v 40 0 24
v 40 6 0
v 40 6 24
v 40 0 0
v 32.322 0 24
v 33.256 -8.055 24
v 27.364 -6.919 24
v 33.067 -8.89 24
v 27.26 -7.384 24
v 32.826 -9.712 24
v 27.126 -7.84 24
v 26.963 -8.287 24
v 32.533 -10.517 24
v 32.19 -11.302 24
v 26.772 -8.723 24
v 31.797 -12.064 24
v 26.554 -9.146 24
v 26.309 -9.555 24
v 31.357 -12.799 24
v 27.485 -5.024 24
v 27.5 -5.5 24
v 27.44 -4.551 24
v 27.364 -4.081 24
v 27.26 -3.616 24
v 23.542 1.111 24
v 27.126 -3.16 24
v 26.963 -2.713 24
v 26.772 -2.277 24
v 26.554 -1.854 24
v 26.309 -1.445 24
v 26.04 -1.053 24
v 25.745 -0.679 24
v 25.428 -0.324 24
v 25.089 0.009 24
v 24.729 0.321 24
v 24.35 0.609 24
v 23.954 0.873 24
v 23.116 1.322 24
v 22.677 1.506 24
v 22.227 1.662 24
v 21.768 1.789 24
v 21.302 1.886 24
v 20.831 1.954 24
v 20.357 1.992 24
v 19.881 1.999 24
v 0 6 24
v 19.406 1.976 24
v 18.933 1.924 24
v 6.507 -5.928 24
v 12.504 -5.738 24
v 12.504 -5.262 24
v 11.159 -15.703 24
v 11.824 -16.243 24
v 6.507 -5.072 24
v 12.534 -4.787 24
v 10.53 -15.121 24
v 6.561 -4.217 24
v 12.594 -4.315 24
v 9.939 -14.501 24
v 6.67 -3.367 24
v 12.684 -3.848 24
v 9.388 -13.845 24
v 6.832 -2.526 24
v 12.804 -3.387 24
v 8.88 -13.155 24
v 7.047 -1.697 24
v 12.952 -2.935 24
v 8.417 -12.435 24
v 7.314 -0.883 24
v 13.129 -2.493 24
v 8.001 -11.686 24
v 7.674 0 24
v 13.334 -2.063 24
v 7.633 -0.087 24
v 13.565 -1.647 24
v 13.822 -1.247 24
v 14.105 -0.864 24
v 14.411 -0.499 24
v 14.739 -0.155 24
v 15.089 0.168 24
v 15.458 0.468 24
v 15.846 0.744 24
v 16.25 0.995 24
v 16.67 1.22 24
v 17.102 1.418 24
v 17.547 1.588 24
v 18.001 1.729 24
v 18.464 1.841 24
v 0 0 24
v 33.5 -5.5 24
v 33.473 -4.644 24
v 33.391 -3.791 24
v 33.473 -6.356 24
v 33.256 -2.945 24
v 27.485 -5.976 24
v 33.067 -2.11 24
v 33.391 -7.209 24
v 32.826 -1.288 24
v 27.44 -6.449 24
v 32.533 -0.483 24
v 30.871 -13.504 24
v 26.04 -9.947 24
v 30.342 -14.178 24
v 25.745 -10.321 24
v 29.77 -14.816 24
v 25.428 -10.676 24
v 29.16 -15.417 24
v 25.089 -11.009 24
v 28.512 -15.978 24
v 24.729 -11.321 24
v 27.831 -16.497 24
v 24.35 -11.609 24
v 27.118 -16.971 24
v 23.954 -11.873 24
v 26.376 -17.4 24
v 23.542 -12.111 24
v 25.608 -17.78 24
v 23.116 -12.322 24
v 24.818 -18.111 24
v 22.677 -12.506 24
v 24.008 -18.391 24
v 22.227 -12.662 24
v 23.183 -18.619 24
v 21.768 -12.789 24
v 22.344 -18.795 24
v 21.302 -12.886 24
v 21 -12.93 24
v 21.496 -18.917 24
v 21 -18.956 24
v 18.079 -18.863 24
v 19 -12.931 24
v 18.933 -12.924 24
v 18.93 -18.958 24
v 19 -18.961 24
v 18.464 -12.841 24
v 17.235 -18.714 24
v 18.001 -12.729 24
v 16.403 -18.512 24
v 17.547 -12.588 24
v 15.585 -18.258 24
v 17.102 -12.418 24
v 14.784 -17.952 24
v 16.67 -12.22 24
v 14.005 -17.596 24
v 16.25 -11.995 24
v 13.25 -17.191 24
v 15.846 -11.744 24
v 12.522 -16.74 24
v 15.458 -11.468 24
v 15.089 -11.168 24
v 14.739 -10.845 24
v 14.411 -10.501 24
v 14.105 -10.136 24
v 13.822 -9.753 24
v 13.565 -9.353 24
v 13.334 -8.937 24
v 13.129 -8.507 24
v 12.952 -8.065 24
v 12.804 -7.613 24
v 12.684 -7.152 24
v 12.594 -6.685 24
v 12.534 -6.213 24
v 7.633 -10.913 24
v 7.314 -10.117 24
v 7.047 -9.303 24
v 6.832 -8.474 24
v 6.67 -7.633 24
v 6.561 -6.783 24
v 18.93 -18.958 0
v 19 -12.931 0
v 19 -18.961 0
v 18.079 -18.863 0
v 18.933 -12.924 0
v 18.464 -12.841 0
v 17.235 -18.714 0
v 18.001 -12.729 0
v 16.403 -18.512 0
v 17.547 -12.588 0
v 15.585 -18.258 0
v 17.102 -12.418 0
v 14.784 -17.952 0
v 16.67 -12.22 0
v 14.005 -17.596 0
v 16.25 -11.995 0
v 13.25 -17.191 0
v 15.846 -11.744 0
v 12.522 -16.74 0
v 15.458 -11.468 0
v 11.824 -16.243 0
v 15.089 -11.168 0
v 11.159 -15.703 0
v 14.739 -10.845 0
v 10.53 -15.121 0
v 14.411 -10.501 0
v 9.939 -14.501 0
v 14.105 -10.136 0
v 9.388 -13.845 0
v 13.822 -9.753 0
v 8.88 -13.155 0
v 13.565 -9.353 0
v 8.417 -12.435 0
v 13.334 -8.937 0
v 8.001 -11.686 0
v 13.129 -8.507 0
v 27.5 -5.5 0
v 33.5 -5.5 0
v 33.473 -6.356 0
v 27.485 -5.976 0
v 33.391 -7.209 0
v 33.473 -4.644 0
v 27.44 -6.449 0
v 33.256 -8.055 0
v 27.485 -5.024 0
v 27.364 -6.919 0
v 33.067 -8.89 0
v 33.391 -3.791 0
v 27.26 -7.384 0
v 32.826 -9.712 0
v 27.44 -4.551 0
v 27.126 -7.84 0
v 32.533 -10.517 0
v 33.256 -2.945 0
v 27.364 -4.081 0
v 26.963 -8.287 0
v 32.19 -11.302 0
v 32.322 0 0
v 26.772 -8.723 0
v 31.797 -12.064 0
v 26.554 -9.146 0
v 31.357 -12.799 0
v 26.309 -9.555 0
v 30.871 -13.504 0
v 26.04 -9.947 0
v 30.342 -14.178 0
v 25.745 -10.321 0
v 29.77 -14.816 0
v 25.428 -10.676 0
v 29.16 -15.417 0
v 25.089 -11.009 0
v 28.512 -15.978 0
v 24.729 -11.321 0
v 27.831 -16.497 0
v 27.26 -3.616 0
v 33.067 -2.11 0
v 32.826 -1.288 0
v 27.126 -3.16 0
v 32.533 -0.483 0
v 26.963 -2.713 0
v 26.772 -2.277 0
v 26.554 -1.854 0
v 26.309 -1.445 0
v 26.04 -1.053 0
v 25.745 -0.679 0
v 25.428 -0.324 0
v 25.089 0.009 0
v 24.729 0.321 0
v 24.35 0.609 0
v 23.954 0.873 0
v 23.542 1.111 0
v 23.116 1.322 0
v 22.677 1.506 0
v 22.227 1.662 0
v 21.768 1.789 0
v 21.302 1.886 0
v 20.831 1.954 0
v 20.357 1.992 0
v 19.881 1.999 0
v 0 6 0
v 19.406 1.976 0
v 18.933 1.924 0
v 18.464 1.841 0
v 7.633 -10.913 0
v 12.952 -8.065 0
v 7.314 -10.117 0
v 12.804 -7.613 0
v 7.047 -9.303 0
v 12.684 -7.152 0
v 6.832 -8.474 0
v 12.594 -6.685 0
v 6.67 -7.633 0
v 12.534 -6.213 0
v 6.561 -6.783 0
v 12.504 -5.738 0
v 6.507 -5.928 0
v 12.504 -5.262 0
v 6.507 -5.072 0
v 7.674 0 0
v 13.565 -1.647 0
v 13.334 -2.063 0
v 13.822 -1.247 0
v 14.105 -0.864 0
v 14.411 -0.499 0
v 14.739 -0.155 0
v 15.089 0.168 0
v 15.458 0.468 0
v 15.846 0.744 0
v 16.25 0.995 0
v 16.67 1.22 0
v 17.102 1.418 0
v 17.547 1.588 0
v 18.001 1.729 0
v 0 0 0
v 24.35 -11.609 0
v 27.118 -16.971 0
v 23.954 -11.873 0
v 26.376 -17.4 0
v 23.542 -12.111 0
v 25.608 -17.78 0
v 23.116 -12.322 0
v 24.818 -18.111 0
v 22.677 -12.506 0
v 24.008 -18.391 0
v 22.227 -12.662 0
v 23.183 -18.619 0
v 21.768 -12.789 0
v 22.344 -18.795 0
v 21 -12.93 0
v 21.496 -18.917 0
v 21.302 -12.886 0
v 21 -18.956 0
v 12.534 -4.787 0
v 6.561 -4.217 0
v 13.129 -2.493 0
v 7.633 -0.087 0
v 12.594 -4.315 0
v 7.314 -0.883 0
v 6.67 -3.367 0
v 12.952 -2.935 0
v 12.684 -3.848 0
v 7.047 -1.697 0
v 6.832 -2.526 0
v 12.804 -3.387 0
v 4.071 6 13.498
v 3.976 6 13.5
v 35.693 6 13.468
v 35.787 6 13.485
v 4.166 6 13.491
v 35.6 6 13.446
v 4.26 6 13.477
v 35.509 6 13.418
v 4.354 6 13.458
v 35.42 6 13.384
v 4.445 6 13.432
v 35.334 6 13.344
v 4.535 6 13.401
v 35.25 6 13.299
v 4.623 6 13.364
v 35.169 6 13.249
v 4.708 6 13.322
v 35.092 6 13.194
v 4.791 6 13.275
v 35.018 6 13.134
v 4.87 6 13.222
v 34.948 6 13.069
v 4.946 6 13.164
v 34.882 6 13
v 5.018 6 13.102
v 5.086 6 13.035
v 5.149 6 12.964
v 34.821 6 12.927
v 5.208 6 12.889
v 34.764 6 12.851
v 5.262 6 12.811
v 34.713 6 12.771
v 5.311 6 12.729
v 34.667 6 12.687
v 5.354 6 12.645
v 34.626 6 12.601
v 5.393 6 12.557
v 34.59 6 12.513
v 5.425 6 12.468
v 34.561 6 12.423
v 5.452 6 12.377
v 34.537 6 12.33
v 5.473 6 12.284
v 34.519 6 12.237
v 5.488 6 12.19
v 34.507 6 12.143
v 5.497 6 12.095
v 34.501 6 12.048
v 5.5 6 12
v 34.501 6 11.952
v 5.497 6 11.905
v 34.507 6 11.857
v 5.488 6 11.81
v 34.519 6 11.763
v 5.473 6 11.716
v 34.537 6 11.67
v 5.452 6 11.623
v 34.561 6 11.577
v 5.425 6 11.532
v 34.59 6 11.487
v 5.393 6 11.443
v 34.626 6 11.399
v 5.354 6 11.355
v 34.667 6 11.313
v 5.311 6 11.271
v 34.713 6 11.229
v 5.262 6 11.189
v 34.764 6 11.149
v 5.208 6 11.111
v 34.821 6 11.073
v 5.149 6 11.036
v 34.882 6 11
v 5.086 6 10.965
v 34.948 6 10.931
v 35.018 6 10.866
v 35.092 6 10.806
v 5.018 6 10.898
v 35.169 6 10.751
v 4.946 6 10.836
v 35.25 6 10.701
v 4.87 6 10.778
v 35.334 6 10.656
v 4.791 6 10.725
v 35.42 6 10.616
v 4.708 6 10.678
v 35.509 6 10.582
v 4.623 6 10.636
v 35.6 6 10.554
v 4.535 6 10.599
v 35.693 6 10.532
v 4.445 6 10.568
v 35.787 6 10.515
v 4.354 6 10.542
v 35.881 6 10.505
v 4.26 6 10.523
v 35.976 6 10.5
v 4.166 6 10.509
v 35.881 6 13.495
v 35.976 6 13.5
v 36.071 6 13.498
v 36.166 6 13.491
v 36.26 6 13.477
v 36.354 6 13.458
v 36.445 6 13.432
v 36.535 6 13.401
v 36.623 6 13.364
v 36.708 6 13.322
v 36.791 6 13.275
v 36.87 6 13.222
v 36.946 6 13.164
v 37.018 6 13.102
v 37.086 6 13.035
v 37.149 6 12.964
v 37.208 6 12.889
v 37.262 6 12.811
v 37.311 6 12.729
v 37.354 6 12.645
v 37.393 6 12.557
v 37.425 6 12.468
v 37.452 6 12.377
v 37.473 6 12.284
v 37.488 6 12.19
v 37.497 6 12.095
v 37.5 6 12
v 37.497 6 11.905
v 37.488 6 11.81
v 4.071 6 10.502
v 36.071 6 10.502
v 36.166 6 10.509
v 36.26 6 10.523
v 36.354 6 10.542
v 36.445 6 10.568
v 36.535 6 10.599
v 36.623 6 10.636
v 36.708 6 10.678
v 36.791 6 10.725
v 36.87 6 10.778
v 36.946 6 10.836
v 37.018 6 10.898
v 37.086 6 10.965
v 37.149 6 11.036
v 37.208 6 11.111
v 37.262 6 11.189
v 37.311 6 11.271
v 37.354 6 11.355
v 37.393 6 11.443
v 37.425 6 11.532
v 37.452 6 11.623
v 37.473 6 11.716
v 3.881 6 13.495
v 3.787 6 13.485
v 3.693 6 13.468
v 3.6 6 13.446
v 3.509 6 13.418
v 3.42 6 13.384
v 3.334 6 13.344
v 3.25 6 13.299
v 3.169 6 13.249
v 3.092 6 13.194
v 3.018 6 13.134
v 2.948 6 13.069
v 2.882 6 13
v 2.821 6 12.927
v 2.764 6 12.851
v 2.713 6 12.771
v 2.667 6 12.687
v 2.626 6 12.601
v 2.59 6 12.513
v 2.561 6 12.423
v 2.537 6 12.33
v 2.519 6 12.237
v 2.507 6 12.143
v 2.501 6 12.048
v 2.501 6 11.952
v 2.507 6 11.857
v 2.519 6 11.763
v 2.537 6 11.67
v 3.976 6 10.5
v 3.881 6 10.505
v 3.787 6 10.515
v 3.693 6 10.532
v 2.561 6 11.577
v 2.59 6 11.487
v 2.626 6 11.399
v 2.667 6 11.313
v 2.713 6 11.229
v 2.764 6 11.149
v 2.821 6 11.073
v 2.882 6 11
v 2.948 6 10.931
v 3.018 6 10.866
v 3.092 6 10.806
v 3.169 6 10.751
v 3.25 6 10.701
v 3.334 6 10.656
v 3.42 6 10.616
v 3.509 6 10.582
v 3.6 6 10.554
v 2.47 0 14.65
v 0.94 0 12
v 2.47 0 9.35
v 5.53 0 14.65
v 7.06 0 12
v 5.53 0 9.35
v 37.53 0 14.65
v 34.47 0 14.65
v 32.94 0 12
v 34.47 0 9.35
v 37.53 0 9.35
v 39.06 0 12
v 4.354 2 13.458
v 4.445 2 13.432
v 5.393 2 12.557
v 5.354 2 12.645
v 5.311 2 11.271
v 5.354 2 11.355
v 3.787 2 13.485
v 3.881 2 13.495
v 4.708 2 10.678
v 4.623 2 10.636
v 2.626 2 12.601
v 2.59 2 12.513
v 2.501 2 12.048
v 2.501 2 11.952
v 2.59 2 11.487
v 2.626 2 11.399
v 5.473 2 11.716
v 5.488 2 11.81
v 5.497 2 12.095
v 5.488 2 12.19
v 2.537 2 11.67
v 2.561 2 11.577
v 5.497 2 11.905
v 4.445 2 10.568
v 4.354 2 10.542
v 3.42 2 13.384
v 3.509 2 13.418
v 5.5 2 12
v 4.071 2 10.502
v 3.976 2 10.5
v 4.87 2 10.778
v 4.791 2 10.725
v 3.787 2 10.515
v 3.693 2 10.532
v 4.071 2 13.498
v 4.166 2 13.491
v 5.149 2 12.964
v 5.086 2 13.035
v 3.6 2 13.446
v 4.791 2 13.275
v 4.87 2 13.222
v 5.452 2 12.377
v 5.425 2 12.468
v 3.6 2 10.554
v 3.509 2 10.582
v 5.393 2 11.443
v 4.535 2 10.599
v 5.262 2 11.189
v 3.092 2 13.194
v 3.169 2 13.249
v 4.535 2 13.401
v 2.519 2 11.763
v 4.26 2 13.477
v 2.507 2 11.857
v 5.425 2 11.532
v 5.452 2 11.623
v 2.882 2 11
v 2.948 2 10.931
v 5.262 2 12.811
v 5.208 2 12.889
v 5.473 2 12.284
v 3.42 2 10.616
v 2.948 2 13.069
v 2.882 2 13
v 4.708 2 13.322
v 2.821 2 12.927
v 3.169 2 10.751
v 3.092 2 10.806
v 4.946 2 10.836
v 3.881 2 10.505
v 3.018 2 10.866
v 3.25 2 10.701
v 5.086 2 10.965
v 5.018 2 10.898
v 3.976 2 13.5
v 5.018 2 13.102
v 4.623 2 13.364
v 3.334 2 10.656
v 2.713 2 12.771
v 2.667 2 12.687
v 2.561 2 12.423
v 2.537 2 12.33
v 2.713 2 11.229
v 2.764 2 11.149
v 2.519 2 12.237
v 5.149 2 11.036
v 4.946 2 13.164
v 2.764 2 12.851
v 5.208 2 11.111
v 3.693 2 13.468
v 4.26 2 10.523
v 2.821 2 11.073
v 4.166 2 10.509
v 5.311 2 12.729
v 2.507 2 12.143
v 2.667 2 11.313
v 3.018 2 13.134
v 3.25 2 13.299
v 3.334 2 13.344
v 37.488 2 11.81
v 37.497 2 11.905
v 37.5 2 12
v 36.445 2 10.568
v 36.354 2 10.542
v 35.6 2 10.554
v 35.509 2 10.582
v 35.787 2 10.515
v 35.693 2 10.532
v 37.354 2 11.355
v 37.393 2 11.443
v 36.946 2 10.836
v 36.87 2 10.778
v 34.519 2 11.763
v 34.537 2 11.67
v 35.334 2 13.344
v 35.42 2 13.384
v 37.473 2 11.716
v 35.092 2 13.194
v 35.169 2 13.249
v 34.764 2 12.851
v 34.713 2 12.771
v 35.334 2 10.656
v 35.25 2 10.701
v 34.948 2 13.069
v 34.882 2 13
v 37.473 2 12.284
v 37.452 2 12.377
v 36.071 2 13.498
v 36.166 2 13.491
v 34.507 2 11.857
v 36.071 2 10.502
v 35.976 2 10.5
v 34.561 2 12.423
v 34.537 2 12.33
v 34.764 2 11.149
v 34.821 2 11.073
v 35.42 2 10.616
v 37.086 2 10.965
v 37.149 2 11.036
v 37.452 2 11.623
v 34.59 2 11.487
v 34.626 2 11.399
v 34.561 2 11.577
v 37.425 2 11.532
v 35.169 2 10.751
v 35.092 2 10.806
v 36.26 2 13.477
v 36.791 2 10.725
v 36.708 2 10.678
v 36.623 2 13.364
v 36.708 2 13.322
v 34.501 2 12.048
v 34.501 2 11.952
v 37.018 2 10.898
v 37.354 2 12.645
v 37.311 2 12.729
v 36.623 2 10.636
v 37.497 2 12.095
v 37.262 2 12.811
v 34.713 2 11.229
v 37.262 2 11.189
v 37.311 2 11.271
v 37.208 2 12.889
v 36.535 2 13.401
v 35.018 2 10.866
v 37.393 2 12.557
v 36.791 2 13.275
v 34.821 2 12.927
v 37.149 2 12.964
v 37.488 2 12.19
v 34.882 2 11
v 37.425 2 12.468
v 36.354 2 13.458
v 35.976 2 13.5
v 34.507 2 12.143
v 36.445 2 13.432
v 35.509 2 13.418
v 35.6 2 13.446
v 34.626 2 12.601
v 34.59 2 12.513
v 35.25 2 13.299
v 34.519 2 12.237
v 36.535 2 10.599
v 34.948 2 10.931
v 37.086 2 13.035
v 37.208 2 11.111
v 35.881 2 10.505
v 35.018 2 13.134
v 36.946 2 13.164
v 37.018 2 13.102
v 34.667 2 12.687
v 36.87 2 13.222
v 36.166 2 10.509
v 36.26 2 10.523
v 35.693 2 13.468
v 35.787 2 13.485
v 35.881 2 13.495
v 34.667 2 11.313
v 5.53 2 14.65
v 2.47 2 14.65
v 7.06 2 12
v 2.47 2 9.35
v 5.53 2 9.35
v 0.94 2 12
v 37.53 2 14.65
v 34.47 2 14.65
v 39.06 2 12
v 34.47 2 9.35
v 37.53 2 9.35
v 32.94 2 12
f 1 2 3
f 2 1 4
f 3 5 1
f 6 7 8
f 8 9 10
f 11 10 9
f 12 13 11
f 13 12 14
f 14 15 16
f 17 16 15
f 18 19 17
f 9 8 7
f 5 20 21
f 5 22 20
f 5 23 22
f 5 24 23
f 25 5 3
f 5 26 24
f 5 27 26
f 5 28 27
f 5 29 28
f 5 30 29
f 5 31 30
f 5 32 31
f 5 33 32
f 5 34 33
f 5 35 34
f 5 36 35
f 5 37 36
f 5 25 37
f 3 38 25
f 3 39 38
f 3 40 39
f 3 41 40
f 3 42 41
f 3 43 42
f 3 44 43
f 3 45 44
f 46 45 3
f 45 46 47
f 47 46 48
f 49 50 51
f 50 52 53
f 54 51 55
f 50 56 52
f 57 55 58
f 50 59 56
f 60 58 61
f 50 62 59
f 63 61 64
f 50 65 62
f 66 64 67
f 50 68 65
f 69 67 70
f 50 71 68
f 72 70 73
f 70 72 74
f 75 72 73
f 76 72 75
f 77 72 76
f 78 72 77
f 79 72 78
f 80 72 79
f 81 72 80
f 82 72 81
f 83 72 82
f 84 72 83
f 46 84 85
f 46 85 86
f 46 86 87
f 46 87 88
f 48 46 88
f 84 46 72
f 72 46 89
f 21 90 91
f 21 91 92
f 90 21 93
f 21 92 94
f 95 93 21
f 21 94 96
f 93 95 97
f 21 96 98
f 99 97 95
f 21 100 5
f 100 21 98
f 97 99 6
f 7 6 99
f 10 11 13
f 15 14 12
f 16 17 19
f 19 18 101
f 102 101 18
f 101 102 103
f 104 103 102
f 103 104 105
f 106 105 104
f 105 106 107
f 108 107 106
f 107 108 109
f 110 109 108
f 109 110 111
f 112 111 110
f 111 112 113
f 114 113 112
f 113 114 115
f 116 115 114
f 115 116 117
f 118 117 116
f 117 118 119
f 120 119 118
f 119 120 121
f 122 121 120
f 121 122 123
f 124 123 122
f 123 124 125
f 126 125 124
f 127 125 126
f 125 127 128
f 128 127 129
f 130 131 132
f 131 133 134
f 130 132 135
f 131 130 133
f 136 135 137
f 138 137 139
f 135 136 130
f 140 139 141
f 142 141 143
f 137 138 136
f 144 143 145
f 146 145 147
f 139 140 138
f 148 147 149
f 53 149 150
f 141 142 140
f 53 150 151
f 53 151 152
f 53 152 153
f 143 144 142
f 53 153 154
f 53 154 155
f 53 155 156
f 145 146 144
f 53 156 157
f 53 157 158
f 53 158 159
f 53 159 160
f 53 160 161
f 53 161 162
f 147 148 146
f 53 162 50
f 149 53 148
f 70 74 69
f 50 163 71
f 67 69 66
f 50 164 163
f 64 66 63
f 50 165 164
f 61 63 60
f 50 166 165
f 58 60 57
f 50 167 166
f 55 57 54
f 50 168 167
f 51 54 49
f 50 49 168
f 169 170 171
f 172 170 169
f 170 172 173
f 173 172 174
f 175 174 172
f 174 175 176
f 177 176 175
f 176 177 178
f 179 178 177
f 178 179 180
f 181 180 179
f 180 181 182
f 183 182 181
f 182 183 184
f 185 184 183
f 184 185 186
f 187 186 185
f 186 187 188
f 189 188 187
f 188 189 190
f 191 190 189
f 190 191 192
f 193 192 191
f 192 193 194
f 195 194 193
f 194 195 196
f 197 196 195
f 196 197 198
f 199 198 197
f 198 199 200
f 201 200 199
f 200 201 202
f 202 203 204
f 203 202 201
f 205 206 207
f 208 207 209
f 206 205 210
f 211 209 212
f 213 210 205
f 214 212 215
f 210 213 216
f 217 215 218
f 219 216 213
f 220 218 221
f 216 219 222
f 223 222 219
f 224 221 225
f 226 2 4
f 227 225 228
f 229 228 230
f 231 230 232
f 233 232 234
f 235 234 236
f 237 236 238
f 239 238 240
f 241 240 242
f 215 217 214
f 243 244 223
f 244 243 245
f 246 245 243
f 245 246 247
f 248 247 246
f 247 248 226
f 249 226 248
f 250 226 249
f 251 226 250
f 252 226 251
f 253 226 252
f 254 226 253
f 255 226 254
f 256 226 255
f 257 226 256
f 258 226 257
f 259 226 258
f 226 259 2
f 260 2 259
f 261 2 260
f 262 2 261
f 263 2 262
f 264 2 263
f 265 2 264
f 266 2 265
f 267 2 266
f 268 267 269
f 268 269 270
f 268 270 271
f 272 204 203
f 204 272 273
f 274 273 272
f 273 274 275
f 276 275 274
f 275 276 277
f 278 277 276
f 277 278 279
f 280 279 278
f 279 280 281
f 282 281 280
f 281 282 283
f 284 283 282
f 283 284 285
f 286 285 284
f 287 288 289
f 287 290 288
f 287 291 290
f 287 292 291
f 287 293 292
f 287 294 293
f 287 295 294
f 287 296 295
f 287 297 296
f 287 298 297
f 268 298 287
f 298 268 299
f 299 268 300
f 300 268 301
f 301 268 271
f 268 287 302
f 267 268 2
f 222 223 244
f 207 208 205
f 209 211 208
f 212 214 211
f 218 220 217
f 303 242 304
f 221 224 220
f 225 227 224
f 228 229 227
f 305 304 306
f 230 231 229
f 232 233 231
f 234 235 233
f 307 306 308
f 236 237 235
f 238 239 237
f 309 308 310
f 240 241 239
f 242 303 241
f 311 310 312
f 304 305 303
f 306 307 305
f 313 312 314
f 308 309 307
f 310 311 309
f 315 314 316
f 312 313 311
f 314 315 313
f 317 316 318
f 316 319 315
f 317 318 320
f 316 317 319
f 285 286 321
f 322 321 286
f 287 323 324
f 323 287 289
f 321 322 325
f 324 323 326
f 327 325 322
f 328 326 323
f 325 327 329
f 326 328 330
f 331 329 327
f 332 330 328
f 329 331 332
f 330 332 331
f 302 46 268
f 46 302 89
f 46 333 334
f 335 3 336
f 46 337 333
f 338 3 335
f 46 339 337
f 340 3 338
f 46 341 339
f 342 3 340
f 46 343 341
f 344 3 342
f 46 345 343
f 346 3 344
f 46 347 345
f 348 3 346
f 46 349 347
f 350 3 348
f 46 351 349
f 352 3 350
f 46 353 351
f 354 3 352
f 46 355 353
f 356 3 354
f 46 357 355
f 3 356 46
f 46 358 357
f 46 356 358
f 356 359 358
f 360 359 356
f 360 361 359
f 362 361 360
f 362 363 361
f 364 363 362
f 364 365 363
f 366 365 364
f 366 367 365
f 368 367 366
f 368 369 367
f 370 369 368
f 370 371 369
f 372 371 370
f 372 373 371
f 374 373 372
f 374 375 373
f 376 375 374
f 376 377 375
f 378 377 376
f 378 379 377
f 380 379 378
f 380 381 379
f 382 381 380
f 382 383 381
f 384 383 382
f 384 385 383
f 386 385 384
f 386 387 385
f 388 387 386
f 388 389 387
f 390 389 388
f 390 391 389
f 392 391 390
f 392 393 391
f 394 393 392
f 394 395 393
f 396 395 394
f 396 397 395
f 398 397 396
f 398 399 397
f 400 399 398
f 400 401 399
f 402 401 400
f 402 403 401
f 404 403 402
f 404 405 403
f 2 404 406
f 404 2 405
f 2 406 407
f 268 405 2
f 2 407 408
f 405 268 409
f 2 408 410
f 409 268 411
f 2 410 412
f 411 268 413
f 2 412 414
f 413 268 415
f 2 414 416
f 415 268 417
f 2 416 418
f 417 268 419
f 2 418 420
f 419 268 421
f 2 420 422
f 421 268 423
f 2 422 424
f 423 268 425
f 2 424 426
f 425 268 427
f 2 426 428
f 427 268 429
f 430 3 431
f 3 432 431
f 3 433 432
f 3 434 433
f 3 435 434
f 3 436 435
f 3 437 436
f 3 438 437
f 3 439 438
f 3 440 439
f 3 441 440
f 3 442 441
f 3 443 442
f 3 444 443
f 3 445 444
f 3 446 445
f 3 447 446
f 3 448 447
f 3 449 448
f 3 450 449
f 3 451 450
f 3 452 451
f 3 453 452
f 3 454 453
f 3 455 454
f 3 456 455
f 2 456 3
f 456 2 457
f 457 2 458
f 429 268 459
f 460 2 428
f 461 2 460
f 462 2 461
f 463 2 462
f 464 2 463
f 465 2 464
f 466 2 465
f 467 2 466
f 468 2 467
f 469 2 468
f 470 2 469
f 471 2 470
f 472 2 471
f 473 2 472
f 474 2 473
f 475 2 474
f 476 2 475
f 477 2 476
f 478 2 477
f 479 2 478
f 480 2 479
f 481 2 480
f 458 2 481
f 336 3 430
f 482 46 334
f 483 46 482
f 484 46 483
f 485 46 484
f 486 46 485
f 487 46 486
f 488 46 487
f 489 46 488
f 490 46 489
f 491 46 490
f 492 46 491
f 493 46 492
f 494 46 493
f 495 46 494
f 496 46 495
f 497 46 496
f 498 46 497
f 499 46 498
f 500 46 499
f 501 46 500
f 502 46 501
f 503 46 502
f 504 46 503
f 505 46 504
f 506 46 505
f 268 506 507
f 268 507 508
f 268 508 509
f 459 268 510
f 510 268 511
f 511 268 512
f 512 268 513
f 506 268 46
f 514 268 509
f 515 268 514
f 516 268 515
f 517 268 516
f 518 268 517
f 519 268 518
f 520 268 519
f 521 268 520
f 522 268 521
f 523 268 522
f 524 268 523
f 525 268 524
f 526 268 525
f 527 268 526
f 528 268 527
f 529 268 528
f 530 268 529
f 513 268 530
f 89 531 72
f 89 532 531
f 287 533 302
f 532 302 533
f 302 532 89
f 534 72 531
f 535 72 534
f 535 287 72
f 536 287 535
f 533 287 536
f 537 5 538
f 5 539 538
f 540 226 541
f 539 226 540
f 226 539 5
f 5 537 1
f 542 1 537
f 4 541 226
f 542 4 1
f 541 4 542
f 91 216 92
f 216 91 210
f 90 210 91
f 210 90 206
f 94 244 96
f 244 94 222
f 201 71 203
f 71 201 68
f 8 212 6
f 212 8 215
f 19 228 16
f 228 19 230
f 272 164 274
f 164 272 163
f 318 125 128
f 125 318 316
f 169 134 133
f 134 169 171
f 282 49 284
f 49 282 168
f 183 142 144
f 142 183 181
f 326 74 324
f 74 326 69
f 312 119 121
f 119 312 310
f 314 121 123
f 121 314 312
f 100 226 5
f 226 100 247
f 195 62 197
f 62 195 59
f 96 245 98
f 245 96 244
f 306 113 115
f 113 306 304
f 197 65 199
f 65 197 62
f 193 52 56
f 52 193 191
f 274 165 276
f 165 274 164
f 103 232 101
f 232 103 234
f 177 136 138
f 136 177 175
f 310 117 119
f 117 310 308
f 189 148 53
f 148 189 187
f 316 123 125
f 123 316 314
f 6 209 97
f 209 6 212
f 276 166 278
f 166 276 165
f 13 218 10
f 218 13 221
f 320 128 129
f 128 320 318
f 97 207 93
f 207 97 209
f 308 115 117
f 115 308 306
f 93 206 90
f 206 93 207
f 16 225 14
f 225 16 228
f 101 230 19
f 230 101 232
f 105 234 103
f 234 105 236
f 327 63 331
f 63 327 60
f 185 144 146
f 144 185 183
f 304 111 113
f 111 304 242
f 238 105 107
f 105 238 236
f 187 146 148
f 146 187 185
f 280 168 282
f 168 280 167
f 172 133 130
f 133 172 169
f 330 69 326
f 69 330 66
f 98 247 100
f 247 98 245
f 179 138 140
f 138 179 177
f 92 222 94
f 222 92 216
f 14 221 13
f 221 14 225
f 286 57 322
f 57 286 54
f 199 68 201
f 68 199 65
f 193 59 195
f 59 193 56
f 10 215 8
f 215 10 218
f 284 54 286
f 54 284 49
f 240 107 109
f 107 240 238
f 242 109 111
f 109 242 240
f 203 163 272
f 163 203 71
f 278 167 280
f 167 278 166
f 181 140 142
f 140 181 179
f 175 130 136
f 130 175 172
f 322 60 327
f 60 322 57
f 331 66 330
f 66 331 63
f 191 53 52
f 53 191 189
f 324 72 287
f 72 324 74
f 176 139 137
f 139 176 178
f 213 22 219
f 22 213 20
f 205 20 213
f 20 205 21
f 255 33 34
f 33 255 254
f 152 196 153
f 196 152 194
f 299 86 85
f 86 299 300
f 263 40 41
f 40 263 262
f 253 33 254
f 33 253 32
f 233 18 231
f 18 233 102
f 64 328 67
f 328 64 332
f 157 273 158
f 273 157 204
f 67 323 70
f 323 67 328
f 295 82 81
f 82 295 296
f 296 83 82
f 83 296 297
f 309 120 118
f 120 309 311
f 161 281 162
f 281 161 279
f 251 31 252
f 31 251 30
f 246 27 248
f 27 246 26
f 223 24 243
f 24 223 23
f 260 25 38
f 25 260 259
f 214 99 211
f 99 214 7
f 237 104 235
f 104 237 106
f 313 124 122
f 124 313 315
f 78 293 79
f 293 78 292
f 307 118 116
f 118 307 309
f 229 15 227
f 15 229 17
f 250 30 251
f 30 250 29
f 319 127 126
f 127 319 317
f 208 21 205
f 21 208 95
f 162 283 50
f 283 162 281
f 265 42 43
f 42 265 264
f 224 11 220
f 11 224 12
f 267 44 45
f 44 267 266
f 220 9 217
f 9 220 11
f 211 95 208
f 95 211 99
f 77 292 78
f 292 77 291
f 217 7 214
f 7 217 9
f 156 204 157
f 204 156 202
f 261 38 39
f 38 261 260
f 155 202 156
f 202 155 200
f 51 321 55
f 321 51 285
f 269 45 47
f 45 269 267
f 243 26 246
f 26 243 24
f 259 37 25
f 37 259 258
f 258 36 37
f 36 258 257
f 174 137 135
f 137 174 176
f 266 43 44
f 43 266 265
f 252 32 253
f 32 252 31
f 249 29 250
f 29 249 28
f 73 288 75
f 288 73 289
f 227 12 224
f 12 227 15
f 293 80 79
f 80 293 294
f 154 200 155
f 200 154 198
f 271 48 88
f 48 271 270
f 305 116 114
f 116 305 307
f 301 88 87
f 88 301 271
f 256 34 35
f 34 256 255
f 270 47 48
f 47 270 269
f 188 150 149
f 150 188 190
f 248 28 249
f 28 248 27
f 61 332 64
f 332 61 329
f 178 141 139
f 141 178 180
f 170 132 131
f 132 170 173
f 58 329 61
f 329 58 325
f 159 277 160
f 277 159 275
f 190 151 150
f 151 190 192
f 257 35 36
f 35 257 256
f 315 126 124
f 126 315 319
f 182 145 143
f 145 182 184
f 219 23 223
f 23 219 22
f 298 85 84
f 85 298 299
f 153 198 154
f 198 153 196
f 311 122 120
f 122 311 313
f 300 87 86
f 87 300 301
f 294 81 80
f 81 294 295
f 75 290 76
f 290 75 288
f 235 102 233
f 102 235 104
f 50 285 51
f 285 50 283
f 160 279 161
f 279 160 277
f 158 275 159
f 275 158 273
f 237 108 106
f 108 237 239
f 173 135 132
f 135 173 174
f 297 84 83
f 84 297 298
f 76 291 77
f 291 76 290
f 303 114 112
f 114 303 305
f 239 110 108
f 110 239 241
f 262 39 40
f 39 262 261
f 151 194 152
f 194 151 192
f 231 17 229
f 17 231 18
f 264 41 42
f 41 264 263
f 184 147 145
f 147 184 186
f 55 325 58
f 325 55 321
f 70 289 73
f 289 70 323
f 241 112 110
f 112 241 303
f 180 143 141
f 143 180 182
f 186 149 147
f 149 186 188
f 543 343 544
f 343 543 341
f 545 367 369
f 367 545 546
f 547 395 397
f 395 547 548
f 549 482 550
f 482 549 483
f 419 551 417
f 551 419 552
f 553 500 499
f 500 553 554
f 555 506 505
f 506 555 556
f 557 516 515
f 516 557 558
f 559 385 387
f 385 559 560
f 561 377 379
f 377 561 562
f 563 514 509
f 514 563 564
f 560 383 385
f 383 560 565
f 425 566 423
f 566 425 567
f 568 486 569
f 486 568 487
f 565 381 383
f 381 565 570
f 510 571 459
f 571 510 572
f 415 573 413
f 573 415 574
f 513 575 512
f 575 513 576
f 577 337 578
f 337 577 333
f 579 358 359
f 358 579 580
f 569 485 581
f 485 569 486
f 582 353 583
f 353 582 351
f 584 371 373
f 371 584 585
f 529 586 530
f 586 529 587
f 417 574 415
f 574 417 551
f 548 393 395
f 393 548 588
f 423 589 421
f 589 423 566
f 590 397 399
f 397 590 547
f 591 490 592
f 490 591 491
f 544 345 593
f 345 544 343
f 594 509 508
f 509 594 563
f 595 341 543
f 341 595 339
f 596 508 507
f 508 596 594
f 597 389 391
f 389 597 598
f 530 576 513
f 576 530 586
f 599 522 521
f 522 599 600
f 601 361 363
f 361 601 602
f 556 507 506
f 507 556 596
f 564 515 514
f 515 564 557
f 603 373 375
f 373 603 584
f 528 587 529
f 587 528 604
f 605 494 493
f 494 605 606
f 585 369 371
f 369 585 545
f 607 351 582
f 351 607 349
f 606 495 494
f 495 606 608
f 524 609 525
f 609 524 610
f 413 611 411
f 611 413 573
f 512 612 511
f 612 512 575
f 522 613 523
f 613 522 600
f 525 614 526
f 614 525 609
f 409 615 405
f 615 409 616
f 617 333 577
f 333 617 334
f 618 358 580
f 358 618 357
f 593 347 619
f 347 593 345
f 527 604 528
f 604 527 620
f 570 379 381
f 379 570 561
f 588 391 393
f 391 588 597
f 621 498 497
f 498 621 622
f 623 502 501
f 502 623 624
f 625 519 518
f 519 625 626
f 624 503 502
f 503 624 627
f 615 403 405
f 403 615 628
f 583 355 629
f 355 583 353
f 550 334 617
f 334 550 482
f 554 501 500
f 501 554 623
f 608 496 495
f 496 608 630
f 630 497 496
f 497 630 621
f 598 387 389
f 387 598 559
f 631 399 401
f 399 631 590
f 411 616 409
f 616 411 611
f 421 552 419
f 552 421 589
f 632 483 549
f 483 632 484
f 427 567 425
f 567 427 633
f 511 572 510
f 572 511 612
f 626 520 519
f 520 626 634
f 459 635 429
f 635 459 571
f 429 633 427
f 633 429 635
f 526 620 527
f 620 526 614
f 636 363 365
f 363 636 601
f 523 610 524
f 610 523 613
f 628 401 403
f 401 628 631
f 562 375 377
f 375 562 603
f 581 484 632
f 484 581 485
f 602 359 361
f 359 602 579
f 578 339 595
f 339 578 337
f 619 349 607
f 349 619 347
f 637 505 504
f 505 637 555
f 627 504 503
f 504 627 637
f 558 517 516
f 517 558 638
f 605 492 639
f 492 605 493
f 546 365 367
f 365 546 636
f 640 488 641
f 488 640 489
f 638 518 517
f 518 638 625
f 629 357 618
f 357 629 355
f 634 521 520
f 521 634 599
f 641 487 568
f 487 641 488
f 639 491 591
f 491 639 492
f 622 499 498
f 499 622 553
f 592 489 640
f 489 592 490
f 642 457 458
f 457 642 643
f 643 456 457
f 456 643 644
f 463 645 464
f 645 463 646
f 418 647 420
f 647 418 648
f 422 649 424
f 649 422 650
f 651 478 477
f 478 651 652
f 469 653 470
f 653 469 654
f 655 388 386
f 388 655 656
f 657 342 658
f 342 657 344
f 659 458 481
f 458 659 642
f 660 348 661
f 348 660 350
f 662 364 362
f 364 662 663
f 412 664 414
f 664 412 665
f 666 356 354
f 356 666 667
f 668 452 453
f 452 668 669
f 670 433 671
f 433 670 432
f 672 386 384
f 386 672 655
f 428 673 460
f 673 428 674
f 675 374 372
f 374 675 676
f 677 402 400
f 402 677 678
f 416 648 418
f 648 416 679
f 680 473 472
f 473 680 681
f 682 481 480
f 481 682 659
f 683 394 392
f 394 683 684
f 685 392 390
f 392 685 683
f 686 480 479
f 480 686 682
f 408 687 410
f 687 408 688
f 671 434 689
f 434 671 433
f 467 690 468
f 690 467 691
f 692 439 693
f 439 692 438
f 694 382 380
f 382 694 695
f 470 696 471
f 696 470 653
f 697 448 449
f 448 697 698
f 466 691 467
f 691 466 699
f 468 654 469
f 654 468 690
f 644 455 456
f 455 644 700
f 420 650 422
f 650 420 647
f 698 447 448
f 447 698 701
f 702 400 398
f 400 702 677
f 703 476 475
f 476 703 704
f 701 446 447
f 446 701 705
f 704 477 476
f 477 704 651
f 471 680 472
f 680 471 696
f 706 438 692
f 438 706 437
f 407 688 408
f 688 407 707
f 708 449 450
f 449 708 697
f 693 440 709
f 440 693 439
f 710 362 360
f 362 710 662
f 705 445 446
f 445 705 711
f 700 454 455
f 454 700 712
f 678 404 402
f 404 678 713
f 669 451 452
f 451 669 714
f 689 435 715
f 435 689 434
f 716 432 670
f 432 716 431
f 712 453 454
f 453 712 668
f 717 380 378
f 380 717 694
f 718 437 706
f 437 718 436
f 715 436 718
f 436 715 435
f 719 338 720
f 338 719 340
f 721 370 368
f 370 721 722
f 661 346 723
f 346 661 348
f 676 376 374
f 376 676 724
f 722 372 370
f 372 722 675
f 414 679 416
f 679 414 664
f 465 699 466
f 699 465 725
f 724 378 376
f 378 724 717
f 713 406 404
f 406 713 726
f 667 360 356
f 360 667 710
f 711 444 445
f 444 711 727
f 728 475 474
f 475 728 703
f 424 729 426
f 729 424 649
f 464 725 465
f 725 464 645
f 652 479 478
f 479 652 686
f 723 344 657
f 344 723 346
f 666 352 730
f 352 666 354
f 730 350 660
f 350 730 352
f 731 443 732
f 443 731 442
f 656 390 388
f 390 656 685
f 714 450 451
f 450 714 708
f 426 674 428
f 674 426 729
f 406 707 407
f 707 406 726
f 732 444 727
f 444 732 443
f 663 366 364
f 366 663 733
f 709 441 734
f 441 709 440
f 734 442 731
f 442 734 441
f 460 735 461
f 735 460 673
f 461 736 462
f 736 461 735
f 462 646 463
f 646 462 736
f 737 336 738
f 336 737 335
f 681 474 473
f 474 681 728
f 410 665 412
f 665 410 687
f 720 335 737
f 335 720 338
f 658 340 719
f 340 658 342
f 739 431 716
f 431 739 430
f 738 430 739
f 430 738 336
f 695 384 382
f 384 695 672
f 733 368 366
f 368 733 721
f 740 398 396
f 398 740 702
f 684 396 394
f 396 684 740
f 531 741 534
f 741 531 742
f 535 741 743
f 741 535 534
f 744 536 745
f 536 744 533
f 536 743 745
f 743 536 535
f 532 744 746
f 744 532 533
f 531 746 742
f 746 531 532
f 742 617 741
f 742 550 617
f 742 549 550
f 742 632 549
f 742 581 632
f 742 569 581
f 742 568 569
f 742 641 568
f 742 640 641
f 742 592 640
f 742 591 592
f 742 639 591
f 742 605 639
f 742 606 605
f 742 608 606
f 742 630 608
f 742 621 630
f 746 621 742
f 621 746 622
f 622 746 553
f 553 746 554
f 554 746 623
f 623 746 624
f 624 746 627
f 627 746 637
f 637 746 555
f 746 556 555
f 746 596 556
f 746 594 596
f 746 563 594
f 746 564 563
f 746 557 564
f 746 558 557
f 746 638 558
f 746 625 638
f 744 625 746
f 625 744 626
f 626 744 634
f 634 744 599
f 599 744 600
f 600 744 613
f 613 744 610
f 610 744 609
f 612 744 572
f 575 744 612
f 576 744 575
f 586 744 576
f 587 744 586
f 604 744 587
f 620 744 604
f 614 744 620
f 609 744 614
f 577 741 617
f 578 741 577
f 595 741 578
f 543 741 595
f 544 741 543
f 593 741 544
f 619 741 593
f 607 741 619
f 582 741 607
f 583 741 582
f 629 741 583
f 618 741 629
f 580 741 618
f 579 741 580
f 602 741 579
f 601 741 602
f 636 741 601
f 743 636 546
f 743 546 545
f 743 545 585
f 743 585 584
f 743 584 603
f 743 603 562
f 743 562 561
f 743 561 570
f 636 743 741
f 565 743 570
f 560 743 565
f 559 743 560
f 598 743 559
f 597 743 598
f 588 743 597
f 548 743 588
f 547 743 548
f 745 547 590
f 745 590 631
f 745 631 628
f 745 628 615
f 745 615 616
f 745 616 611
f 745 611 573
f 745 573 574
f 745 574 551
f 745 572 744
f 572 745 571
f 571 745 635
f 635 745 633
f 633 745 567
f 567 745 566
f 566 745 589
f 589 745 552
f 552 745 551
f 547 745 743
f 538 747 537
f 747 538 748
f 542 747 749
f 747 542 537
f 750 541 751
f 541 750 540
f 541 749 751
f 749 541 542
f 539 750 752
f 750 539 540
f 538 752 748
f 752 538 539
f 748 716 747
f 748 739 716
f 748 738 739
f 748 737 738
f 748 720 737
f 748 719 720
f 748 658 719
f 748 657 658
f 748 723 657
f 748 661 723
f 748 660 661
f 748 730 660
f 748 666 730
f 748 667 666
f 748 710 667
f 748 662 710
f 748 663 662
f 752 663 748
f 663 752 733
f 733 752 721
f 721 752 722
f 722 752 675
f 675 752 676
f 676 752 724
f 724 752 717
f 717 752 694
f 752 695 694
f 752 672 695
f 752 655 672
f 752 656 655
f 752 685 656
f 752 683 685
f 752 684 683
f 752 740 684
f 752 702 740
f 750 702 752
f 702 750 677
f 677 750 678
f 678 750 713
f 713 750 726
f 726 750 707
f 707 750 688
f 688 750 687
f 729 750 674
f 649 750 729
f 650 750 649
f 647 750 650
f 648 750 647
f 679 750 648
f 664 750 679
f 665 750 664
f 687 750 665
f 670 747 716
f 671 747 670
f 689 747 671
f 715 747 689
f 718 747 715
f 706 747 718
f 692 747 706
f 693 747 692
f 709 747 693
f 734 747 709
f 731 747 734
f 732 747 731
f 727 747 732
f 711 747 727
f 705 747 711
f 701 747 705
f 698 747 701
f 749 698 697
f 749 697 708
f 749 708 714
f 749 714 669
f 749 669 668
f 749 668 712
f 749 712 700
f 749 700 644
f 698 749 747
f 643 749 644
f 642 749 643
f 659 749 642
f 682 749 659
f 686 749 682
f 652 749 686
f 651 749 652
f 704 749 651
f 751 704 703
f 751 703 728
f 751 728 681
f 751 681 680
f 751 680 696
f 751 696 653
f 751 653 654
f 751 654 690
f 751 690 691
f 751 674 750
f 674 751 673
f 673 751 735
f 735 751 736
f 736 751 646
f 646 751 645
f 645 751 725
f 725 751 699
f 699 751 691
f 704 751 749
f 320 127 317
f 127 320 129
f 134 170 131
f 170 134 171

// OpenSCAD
// file: configuration.scad
// Copyright (C) 2012 t00tie
// Adapto is licensed under the Creative Commons - GNU GPL license.
// http://creativecommons.org/licenses/GPL/2.0/

// Configuration file for Adapto OpenSCAD files

boltOuterRadius=5/2;// outer radius of bolt threads, 5 for M5 bolts
boltLength=60;//bolt length without head (threaded part only)
washerOuterRadius=13/2;// washers that fit the bolts
washerLength=10;// this is large because it is used to make holes for washers

frameX=20;// width of frame parts (alu, wood etc.)
frameY=20;// ditto

boltOffset=frameX/2;// How far in the bolt holes go, may need tweaking if framX!=frameY

smoothRod=8;// diameter of smooth rods


// Copied from 
// PRUSA Mendel  
// Default metric sizes
// GNU GPL v3
// Josef Průša
// josefprusa@me.com
// prusadjs.cz
// http://www.reprap.org/wiki/Prusa_Mendel
// http://github.com/prusajr/PrusaMendel
m3_nut_diameter = 5.3;
m3_nut_diameter_bigger = ((m3_nut_diameter  / 2) / cos (180 / 6))*2;
// main file
// Copyright (C) 2012 t00tie
// After an stl designed by RoTorIT
// Adapto is licensed under the Creative Commons - GNU GPL license.
// http://creativecommons.org/licenses/GPL/2.0/

include <configuration.scad>;

$fn=99;// wild guess
thickness=6; // wall thickness
length=40;
height=24;// length of linear bearing
lmuuDiameter=15;// outer diameter of linear bearing, lm8uu is 8x15x24mm, lm10uu is 10x19x29mm

difference(){
	union(){
		cube([length, thickness, height]);
		translate([length/2, -lmuuDiameter/2-0*thickness+2, 0]) cylinder(r=lmuuDiameter/2+thickness, h=height);
	}
	translate([length/2, -lmuuDiameter/2-0*thickness+2, -1]) cylinder(r=lmuuDiameter/2, h=height+2);
	translate([-1, thickness, -1]) cube([length+2, thickness, height+2]);
	translate([4, -1, height/2]) rotate([-90, 0, 0]) cylinder(r=3/2, h=thickness+2);
	translate([length-4, -1, height/2]) rotate([-90, 0, 0]) cylinder(r=3/2, h=thickness+2);
	translate([4, -1, height/2]) rotate([-90, 0, 0]) cylinder(r=m3_nut_diameter_bigger/2, h=2+1, $fn=6);
	translate([length-4, -1, height/2]) rotate([-90, 0, 0]) cylinder(r=m3_nut_diameter_bigger/2, h=2+1, $fn=6);
	translate([length/2-1, -2*lmuuDiameter, -1]) cube([2, 2*lmuuDiameter, height+2]);
}
